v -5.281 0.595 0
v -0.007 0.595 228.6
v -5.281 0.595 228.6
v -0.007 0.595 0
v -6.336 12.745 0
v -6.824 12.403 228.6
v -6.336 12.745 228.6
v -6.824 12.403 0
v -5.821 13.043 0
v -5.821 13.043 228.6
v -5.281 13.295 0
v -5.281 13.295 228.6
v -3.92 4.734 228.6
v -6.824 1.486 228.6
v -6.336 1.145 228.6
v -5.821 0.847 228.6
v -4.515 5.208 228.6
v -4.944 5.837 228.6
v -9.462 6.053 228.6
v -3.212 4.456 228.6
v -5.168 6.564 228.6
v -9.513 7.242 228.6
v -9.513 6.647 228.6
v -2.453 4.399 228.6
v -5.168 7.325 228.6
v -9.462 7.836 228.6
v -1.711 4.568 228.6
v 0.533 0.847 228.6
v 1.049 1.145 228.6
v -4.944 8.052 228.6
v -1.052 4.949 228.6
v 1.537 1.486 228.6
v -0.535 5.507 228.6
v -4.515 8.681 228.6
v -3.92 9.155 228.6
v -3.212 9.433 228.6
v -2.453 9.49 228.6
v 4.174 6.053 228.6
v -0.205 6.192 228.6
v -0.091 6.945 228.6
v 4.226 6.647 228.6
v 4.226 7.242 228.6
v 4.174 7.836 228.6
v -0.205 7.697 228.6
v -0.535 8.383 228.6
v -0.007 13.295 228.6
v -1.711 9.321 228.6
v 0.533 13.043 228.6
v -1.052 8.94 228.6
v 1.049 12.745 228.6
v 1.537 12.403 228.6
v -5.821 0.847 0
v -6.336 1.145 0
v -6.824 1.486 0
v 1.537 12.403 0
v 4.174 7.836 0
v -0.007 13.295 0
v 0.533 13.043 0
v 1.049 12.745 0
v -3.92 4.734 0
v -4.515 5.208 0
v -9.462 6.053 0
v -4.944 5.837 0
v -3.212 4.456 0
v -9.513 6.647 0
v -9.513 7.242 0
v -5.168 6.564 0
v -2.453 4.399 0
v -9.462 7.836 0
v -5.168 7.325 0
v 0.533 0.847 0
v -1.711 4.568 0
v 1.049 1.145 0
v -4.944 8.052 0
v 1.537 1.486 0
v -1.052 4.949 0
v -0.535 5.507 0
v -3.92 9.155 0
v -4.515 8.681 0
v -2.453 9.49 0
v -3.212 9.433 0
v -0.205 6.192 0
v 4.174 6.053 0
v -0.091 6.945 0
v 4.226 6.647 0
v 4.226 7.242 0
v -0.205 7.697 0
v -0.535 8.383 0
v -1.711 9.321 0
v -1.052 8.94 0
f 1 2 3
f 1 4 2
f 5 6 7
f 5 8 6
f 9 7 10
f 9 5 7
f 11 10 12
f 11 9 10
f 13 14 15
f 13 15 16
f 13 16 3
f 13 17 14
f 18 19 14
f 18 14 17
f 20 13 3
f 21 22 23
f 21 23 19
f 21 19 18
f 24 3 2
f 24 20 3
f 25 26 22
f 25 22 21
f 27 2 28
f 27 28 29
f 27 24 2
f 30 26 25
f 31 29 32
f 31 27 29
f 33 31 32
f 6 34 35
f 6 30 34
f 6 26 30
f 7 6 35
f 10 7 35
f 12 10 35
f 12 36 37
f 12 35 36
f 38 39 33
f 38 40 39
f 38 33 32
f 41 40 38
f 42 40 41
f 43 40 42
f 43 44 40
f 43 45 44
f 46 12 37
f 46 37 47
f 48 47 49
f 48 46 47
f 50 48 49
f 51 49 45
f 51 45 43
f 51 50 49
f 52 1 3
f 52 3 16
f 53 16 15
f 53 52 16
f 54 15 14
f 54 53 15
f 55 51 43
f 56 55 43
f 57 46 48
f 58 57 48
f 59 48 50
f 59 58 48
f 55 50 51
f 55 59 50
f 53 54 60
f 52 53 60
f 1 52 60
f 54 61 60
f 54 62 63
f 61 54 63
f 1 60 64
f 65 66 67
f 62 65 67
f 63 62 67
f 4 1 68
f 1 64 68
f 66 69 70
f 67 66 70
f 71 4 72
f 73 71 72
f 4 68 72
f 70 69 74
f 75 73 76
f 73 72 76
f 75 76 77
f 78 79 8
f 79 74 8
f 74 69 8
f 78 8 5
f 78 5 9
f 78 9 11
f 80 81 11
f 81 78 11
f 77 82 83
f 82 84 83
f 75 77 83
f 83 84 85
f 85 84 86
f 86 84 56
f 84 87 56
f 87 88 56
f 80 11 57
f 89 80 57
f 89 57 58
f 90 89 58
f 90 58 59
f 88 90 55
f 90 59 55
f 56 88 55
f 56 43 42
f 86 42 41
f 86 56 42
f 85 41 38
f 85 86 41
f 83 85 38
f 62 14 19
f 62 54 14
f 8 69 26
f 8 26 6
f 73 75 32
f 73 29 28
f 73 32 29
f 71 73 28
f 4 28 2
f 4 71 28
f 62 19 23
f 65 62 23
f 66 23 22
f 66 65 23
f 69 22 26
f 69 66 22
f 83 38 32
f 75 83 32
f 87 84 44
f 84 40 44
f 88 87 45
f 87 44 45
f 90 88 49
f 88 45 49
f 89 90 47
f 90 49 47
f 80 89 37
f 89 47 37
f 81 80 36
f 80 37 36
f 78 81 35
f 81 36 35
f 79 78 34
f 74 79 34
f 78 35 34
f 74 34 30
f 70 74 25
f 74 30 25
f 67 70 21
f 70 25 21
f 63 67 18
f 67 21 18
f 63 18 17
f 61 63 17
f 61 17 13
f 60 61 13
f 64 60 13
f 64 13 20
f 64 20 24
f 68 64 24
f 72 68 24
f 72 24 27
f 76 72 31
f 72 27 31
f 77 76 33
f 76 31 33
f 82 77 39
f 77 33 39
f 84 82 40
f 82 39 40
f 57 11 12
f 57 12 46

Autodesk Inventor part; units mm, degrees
ref_plane "YZ Plane" through (0, 0, 0) normal (1, 0, 0) x (0, 1, 0)
ref_plane "XZ Plane" through (0, 0, 0) normal (0, 1, 0) x (-1, 0, 0)
ref_plane "XY Plane" through (0, 0, 0) normal (0, 0, 1) x (1, 0, 0)
sketch "Sketch1" plane through (0, 0, 0) normal (0, 0, 1) x (1, 0, 0)
  circle A0 centre (-2.6438, 6.9447) radius 6.8758
  line L0 (-9.4616, 7.8359) -> (-6.8245, 12.4034)
  line L1 (-6.8245, 1.4859) -> (-9.4616, 6.0534)
  line L2 (-0.0068, 0.5947) -> (-5.2808, 0.5947)
  line L3 (4.174, 6.0534) -> (1.537, 1.4859)
  line L4 (1.537, 12.4034) -> (4.174, 7.8359)
  line L5 (-5.2808, 13.2947) -> (-0.0068, 13.2947)
  point P0 (0, 0)
  point P1 (1.537, 1.4859)
  dimension "d0" = 13.7516
  dimension "d4" = 360
extrude "Extrusion1" add sketch "Sketch1" along normal blind 228.6 contours A0 L3 L2 L1 L0 L5 L4
sketch "Sketch2" plane through (0, 0, 228.6) normal (0, 0, 1) x (1, 0, 0)
  circle A0 centre (-2.6438, 6.9447) radius 2.5527
  line L0 (-5.2808, 0.5947) -> (-0.0068, 0.5947) projected
  line L1 (-2.6438, 6.9447) -> (-5.2808, 0.5947) construction
  line L2 (-2.6438, 6.9447) -> (-0.0068, 0.5947) construction
  point P0 (0, 0)
  dimension "d8" = 5.1054
  dimension "d9" = 6.35
extrude "Extrusion2" cut sketch "Sketch2" against normal blind 228.6
equation "\"d6\" = d5"
equation "\"d10\" = d5"
equation "\"d5\" = 228.6"
properties part number "Thundershaft-7"
